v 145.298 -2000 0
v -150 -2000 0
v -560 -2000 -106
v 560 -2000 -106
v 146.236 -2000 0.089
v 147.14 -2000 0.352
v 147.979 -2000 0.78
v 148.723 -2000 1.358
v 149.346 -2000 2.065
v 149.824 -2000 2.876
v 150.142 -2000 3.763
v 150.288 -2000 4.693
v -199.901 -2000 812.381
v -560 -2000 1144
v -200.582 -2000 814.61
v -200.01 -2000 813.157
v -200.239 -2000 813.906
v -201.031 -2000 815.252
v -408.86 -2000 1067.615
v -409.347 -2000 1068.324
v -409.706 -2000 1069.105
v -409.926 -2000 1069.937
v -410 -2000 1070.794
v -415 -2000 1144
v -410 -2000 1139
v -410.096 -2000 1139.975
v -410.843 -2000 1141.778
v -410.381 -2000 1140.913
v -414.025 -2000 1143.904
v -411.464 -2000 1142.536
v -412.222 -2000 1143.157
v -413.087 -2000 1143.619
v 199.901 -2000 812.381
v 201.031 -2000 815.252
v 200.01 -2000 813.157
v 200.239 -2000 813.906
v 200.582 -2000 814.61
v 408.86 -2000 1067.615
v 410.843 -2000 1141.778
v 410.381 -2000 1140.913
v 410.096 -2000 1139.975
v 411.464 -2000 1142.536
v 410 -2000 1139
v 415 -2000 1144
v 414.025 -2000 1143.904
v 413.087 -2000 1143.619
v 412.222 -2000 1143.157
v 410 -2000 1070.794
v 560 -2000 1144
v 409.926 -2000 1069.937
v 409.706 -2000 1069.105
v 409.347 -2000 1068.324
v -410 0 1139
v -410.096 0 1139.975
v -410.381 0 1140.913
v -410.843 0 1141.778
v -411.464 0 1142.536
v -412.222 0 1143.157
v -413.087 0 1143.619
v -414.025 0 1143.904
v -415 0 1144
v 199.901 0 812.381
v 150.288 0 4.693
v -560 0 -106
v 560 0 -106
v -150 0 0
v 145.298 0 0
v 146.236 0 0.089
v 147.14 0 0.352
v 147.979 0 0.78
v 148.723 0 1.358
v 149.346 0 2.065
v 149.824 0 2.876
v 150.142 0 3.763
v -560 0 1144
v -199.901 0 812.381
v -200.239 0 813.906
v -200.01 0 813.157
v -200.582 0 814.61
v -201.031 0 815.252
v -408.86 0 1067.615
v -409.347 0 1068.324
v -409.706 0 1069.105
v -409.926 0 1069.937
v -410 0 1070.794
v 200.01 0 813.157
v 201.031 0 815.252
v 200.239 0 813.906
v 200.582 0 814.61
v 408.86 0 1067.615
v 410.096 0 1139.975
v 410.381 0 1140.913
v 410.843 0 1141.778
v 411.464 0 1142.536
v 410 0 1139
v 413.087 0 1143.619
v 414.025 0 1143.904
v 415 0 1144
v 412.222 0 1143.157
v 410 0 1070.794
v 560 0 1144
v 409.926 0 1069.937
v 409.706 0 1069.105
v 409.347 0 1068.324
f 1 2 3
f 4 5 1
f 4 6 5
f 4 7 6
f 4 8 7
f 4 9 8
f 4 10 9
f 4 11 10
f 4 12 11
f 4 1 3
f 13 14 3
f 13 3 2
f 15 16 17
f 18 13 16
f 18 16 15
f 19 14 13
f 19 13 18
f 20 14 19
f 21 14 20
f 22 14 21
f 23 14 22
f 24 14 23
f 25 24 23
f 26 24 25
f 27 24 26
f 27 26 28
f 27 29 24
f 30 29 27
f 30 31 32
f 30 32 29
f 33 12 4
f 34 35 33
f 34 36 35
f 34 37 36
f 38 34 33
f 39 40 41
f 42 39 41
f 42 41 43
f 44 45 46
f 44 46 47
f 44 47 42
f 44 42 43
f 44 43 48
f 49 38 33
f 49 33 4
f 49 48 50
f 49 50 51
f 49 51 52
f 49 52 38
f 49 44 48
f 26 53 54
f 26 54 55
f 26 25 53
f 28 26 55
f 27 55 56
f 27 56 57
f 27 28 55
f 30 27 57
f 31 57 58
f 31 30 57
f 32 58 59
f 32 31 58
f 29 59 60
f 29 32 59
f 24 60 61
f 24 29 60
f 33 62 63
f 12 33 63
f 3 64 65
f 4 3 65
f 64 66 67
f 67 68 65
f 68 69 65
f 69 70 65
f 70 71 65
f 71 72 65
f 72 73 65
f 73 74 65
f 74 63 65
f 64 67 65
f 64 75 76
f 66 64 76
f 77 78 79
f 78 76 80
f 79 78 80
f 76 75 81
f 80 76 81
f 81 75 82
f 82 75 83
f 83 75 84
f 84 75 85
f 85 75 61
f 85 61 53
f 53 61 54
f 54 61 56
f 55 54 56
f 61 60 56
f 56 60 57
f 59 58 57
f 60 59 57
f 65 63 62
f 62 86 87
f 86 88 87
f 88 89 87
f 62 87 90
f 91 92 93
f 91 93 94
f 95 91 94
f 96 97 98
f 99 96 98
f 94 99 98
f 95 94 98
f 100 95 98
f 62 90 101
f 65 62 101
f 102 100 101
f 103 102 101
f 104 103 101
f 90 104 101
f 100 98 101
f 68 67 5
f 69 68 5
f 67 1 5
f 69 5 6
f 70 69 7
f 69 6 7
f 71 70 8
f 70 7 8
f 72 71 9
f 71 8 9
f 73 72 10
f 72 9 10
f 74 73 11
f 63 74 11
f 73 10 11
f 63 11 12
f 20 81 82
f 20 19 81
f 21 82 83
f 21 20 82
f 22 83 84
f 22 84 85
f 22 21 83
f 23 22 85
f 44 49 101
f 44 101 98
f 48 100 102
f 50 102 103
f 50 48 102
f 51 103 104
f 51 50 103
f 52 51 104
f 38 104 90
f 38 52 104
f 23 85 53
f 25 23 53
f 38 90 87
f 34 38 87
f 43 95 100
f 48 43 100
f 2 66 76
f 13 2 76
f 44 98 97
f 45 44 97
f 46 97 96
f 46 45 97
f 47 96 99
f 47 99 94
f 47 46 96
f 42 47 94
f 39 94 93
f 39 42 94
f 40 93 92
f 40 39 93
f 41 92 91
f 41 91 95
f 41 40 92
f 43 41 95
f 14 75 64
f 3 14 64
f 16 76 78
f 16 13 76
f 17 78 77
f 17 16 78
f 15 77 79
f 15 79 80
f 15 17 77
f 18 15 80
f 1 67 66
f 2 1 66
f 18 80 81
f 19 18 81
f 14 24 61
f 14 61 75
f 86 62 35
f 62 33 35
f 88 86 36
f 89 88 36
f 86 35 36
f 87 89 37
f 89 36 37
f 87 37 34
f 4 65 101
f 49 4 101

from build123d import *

# Parameters (mm, degrees)
F1_DEPTH = 2000
F2_R     = 5
F3_R     = 5
F4_R     = 5
F5_R     = 5


with BuildPart() as f1:
    # F0 (on Front) → F1 (new body)
    with BuildSketch(Plane.XZ):
        Polygon((150, 0), (0, 0), (-150, 0), (-200, 814), (-410, 1069), (-410, 1144), (-560, 1144), (-560, -106), (0, -106), (560, -106), (560, 1144), (410, 1144), (410, 1069), (200, 814), align=None)
    extrude(amount=F1_DEPTH)

    # F2
    f2_edges = [f1.edges().sort_by_distance(p)[0] for p in [
        (-200, -1000, 814),
    ]]
    fillet(f2_edges, radius=F2_R)

    # F3
    f3_edges = [f1.edges().sort_by_distance(p)[0] for p in [
        (-410, -1000, 1069),
    ]]
    fillet(f3_edges, radius=F3_R)

    # F4
    f4_edges = [f1.edges().sort_by_distance(p)[0] for p in [
        (-410, -1000, 1144),
    ]]
    fillet(f4_edges, radius=F4_R)

    # F5
    f5_edges = [f1.edges().sort_by_distance(p)[0] for p in [
        (410, -1000, 1144),
        (200, -1000, 814),
        (150, -1000, 0),
        (410, -1000, 1069),
    ]]
    fillet(f5_edges, radius=F5_R)


solid = f1.part
